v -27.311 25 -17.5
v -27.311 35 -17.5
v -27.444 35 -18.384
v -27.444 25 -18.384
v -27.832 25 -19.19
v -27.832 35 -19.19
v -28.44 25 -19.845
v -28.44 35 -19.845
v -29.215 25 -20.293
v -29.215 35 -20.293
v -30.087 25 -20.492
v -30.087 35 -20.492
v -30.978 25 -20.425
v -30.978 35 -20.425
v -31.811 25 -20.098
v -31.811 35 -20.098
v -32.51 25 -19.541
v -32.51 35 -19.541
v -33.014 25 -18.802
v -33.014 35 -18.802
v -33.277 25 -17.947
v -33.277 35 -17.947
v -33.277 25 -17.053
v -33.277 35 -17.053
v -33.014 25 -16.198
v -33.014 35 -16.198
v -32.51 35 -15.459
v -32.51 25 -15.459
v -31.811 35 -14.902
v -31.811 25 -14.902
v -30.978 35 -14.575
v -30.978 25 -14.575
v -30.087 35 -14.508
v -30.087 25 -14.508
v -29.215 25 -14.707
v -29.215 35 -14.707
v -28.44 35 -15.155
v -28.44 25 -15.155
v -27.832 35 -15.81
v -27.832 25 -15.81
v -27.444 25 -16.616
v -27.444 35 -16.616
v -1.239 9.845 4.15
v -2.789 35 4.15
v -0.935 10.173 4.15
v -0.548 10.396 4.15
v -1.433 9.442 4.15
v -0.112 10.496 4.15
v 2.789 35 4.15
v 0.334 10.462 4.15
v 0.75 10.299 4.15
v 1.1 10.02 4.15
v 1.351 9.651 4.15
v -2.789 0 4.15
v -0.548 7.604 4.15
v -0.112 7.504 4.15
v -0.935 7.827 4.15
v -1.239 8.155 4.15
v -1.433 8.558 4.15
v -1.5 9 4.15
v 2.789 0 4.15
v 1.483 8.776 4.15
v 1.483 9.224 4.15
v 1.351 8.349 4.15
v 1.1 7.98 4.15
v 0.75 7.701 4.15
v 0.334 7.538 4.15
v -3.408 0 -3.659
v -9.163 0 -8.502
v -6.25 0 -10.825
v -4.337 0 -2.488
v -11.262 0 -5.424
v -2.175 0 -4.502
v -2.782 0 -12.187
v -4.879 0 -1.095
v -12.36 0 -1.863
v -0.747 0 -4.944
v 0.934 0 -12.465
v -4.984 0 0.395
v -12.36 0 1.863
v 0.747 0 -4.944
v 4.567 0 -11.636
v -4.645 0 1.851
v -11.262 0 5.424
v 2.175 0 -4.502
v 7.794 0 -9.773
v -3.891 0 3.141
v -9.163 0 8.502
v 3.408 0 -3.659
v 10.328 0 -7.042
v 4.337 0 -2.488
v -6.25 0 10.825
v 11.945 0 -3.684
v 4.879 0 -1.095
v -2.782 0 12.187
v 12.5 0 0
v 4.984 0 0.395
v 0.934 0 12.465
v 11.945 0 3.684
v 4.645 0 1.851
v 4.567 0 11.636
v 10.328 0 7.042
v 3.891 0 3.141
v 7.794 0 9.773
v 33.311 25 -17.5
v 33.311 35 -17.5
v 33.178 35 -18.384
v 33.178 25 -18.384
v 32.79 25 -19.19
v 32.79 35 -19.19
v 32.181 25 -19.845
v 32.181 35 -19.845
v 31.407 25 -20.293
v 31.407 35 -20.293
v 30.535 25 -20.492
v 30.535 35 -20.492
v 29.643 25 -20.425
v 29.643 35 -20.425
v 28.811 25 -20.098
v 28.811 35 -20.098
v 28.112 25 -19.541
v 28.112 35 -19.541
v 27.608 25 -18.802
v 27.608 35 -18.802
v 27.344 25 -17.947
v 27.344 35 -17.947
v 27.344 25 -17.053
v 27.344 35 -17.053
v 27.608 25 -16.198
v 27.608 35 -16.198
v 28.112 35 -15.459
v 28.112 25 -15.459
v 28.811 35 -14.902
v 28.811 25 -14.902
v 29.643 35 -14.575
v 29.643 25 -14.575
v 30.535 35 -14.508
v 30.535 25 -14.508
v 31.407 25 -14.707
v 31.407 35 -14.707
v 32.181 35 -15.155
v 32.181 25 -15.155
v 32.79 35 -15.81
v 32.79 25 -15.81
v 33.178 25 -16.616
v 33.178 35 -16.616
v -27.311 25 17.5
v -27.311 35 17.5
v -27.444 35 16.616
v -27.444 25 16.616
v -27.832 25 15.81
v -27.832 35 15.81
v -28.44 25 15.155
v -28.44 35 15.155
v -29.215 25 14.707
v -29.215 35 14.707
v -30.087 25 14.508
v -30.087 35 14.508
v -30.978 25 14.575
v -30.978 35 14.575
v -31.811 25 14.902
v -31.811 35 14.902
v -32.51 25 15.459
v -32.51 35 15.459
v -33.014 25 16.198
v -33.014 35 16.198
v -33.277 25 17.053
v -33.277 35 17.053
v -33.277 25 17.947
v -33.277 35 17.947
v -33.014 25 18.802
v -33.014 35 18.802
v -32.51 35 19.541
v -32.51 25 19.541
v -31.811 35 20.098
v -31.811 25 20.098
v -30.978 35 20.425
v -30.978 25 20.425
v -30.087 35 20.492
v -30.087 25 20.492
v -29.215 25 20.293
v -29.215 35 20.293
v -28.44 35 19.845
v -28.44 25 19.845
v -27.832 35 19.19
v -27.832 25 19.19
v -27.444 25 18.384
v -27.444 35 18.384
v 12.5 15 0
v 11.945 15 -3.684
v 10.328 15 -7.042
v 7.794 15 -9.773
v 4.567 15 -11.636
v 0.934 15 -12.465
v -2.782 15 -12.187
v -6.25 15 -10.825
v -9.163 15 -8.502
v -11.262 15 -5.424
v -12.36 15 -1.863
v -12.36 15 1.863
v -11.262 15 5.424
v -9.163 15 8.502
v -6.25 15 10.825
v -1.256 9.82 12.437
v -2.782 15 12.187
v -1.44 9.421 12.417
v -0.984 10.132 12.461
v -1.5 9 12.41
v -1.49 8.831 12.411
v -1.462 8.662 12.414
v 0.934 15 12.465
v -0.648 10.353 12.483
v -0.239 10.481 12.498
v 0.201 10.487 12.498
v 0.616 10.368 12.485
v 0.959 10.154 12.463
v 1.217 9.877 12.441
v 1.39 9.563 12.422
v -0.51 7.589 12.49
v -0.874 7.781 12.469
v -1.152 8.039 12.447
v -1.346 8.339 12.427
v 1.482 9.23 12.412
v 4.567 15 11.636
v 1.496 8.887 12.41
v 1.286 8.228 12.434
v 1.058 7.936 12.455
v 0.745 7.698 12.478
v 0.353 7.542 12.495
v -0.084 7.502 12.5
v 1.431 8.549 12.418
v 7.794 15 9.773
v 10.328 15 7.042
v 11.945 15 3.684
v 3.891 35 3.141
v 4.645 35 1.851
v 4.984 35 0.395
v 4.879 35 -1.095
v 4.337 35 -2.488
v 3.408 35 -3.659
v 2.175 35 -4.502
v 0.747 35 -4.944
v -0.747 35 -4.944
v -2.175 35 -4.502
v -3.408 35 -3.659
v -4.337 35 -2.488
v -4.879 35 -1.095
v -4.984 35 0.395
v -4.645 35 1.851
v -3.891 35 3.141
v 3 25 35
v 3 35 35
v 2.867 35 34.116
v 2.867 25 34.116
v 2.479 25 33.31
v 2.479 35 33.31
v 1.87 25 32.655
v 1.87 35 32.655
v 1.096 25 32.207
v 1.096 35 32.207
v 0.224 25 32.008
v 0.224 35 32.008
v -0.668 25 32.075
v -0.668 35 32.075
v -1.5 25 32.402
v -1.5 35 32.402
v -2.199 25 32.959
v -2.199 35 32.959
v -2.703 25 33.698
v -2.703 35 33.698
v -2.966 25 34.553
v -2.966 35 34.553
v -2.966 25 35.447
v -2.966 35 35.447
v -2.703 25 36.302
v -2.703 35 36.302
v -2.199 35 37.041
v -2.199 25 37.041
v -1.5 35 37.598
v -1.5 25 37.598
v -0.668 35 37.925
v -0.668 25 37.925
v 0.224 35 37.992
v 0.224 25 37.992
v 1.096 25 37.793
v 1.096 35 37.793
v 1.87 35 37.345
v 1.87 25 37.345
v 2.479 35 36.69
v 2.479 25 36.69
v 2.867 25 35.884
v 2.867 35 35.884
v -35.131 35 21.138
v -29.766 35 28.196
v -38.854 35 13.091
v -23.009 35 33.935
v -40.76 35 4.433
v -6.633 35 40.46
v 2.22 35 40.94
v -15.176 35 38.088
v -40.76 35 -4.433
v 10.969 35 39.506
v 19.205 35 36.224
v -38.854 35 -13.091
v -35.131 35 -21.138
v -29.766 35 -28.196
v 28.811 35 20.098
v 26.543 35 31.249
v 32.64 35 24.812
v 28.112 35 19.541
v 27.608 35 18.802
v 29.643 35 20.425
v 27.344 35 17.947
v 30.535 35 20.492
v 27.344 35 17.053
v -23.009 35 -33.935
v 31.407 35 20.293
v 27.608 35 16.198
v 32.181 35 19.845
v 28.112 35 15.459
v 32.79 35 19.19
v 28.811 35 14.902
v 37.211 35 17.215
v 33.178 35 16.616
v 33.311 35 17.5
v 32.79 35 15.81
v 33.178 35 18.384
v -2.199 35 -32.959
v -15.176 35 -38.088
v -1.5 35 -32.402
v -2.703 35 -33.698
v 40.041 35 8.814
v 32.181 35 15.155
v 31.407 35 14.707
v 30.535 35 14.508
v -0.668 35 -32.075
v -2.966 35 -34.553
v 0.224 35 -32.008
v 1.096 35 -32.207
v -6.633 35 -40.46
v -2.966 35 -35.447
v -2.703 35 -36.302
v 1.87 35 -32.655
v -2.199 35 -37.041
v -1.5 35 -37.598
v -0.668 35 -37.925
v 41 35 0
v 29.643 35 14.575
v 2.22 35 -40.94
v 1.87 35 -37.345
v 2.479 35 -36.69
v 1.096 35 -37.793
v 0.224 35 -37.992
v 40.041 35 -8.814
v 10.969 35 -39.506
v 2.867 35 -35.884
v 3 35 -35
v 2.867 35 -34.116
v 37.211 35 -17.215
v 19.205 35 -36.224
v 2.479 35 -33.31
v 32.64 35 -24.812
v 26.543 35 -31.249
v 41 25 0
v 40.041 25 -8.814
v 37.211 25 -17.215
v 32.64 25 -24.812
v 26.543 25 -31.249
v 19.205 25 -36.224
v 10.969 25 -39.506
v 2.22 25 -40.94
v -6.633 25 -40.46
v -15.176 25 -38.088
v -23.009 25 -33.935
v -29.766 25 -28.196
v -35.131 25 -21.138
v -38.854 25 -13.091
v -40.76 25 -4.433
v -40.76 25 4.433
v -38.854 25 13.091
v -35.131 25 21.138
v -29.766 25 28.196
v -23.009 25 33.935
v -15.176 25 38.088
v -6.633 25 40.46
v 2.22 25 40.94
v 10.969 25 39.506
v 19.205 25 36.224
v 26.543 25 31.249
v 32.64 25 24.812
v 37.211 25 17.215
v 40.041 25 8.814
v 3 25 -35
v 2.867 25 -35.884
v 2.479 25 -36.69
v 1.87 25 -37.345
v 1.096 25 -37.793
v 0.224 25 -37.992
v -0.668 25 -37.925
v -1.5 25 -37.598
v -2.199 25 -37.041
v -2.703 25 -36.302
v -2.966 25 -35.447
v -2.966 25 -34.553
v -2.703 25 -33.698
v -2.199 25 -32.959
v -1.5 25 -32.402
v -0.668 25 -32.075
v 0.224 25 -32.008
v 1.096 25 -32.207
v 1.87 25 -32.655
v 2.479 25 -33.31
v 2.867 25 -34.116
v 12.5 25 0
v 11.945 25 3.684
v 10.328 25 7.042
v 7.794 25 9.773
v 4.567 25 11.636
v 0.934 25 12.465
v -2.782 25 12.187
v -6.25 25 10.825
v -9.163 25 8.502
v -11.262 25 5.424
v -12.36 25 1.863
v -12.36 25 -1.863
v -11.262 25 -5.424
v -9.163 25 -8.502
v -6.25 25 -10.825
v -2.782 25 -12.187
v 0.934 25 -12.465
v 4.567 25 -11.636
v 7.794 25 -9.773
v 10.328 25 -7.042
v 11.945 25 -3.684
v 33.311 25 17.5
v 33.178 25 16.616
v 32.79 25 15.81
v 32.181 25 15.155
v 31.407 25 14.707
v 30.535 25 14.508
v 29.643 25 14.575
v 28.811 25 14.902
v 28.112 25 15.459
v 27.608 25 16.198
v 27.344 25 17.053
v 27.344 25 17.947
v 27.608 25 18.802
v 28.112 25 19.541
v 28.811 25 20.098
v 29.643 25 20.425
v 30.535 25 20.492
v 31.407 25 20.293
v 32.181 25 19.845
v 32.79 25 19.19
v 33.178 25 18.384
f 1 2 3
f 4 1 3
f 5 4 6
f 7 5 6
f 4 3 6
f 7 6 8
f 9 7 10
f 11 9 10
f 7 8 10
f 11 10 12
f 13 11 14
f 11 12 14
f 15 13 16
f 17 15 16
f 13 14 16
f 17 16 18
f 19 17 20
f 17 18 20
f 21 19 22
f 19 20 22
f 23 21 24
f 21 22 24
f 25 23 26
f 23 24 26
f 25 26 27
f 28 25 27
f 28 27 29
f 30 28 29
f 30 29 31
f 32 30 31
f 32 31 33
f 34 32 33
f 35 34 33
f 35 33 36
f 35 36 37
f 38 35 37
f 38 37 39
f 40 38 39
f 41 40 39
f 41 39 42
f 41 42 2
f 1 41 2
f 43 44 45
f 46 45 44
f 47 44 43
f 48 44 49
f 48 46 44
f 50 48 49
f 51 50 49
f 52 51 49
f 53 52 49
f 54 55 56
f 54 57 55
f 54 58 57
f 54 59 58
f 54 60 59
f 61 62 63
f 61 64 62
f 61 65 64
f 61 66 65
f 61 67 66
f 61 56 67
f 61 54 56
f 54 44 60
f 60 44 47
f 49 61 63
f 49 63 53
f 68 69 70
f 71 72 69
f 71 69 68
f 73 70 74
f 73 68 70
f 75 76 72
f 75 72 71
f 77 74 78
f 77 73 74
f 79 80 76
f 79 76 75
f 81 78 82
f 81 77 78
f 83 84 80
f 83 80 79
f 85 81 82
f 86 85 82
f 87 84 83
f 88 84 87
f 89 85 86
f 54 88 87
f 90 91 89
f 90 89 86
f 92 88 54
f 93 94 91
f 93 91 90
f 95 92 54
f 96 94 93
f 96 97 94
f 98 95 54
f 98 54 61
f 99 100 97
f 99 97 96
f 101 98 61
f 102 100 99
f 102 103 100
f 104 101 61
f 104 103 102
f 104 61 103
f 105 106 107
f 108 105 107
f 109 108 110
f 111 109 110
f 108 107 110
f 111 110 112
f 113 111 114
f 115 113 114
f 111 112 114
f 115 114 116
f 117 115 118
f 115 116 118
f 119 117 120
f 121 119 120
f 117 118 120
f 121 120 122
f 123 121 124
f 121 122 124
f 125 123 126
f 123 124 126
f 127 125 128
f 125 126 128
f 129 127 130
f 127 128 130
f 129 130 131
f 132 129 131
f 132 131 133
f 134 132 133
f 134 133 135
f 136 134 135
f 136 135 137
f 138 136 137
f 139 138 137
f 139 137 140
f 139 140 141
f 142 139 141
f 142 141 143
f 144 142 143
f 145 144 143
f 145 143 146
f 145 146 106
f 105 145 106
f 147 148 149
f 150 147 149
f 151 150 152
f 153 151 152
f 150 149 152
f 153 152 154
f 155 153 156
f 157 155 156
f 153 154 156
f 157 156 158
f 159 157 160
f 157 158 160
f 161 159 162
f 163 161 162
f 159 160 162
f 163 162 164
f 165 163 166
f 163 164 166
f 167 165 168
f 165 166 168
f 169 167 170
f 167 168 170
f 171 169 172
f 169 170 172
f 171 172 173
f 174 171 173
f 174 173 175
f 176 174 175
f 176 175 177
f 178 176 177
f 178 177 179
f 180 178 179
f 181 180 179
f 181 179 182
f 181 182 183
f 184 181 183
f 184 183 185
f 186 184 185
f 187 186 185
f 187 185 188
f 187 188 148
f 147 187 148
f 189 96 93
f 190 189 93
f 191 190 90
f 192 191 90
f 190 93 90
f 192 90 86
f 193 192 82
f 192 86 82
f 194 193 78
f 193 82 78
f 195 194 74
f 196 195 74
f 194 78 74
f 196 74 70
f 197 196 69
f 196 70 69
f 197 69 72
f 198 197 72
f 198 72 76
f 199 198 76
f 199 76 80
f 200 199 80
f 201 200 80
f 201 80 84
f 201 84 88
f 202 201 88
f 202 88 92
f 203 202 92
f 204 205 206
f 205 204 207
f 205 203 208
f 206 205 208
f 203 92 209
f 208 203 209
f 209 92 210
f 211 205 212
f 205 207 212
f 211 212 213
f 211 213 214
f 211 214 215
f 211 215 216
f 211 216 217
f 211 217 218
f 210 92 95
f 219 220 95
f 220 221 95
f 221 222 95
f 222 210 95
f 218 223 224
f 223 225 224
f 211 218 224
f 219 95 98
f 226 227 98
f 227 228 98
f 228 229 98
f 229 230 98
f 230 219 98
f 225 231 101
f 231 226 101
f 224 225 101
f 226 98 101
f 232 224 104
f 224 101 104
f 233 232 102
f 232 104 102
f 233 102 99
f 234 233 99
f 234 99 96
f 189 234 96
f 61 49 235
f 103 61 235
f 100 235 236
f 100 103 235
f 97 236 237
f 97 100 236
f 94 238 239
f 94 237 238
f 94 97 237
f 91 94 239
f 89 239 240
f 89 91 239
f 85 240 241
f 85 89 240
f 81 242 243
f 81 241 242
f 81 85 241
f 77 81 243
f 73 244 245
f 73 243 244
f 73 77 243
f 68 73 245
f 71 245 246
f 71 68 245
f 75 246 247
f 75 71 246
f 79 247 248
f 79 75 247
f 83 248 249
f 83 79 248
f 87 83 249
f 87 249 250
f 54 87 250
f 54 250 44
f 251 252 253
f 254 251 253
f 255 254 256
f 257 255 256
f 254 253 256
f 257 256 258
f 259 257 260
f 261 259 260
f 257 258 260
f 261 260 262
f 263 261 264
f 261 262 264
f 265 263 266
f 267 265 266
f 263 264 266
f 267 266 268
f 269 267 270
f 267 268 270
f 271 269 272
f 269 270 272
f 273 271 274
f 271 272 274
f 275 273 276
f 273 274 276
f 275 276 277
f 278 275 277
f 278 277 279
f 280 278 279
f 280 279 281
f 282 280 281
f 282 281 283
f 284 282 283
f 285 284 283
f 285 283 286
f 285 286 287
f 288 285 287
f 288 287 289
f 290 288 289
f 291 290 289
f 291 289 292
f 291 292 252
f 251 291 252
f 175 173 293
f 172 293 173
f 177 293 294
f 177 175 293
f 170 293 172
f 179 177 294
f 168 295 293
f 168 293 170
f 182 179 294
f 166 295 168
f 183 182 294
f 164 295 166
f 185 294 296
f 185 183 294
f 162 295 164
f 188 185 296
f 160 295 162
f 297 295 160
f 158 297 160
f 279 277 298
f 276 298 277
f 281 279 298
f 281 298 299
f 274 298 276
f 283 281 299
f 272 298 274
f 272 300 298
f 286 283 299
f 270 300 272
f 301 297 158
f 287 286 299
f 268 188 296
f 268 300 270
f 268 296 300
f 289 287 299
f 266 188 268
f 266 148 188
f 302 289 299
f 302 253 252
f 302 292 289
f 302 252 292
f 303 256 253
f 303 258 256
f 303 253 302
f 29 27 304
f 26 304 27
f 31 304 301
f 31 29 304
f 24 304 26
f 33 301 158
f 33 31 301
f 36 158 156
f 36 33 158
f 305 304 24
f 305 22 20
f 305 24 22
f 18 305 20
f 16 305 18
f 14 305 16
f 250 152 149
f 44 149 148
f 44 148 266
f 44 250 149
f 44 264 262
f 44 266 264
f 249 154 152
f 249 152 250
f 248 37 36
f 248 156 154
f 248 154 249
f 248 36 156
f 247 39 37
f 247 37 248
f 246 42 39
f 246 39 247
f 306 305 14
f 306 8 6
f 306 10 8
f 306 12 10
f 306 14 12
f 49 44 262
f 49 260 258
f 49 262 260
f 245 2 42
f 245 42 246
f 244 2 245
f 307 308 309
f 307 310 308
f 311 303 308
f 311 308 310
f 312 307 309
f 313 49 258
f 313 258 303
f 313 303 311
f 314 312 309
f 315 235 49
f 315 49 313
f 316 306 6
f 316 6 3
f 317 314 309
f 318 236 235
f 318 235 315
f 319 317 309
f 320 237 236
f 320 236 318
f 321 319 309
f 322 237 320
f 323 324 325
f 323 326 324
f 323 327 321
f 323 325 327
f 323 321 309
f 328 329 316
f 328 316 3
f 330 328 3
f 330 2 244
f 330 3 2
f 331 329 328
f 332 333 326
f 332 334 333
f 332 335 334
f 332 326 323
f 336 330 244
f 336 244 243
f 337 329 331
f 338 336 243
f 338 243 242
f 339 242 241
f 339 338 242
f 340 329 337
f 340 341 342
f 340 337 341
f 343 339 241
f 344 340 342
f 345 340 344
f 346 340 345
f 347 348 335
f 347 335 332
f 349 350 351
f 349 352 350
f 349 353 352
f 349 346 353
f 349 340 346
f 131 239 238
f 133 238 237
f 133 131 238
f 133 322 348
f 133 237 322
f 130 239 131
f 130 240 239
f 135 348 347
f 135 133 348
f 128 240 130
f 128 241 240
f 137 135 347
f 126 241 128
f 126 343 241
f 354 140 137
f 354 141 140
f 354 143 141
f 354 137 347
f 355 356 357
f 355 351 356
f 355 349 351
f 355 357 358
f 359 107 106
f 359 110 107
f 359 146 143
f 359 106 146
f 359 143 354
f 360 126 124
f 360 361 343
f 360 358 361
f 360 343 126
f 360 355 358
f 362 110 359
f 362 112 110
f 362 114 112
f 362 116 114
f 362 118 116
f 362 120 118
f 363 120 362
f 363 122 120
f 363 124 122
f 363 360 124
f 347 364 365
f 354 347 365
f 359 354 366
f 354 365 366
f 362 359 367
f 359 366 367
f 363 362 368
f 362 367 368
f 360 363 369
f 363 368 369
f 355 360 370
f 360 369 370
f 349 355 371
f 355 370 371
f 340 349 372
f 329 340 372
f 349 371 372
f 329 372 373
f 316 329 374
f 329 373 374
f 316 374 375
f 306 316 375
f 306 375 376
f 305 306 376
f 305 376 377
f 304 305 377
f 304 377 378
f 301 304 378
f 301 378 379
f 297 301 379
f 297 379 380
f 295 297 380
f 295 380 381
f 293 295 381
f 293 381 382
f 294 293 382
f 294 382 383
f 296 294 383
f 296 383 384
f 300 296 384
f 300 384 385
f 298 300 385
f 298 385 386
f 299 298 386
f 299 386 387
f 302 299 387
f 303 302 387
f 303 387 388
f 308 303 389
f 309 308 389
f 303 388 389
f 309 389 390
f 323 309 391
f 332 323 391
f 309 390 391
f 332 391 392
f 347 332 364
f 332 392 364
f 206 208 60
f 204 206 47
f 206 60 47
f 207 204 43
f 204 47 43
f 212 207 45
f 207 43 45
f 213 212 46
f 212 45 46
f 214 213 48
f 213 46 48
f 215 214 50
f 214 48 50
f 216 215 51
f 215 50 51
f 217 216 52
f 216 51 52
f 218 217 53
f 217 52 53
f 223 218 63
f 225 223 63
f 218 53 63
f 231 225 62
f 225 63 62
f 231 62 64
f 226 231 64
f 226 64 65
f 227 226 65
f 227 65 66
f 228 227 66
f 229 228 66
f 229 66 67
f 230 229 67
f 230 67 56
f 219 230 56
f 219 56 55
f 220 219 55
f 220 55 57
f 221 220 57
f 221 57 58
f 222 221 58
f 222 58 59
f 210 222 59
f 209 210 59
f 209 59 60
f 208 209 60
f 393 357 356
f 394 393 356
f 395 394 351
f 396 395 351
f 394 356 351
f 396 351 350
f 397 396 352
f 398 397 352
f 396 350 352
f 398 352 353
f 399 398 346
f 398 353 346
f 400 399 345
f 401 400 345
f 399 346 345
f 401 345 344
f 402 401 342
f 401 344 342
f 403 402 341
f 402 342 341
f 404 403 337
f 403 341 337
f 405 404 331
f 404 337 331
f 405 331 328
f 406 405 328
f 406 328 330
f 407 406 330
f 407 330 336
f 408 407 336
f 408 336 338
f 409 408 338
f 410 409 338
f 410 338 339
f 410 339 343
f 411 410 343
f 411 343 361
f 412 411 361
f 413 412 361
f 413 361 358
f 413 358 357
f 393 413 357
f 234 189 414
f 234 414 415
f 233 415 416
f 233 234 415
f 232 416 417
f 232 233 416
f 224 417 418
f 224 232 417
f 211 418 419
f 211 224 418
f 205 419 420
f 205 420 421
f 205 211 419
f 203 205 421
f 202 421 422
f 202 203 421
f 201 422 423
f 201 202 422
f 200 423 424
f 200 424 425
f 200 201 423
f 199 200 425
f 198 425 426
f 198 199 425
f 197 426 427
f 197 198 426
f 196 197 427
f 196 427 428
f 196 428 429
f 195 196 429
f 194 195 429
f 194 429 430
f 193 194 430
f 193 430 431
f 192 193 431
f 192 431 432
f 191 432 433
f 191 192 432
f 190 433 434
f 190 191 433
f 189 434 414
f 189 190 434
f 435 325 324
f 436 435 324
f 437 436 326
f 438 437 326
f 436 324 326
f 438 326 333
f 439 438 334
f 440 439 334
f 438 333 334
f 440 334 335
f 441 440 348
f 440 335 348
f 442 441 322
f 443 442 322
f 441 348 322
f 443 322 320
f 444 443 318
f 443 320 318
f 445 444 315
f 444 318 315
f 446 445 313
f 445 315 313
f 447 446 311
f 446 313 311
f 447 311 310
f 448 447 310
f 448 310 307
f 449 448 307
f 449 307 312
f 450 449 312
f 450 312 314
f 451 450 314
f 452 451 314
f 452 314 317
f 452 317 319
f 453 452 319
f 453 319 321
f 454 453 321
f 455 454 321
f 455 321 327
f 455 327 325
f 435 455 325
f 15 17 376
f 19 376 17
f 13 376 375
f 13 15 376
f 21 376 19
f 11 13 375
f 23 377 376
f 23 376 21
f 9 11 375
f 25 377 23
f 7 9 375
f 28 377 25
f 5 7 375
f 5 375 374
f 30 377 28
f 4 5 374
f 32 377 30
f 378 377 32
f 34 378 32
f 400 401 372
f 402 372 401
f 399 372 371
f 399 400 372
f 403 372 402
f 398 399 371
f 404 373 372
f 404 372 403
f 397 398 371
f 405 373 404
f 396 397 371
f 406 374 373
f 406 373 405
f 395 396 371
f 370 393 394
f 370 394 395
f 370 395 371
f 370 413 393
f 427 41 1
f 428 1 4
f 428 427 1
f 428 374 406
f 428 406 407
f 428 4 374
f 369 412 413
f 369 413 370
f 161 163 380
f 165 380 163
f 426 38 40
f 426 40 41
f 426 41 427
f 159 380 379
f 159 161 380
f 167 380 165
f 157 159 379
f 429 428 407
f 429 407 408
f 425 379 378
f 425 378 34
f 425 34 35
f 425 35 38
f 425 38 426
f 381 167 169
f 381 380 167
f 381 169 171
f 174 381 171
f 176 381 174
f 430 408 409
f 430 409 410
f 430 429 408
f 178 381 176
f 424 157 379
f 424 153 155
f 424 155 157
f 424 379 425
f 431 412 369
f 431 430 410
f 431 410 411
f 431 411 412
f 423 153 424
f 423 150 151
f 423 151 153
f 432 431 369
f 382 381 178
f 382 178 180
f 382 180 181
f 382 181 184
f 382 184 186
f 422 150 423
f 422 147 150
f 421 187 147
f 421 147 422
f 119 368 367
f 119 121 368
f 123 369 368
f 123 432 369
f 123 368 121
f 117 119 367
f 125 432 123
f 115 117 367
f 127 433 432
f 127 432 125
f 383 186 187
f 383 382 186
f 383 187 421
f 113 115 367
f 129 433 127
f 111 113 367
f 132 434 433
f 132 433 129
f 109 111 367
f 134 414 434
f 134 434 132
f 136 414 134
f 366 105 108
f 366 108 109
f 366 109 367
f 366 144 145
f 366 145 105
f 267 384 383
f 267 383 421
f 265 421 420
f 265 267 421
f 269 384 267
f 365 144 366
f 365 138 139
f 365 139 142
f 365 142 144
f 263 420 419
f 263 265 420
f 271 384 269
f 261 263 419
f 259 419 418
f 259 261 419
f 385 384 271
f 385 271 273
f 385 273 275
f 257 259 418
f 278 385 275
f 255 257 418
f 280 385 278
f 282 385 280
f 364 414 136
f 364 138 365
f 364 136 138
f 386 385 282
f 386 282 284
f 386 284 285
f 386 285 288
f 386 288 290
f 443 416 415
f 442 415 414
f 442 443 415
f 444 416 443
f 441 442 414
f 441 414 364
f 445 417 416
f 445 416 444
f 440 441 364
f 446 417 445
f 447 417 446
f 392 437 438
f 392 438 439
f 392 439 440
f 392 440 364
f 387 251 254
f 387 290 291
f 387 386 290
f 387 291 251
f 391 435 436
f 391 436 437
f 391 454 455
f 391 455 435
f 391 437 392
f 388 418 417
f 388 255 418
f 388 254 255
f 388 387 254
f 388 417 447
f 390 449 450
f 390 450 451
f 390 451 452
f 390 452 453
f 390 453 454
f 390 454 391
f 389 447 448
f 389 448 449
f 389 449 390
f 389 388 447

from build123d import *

# Parameters (mm, degrees)
SKETCH1_R           = 12.5
SKETCH1_R_2         = 5
BOSS_EXTRUDE1_DEPTH = 15
SKETCH2_R           = 41
SKETCH2_R_2         = 5
BOSS_EXTRUDE2_DEPTH = 20
SKETCH3_R           = 3
CUT_EXTRUDE1_DEPTH  = 36
BOSS_EXTRUDE3_DEPTH = 35
SKETCH5_R           = 1.5
CUT_EXTRUDE2_DEPTH  = 37.85
SKETCH6_R           = 41
SKETCH6_R_2         = 12.5
CUT_EXTRUDE3_DEPTH  = 10


with BuildPart() as part:
    # Sketch1 → Boss-Extrude1 (new body)
    with BuildSketch(Plane(origin=(0, 0, 0), x_dir=(1, 0, 0), z_dir=(0, 1, 0))):
        Circle(SKETCH1_R)
        Circle(SKETCH1_R_2, mode=Mode.SUBTRACT)
    extrude(amount=BOSS_EXTRUDE1_DEPTH)

    # Sketch2 → Boss-Extrude2 (add)
    with BuildSketch(Plane(origin=(0, 15, 0), x_dir=(1, 0, 0), z_dir=(0, 1, 0))):
        Circle(SKETCH2_R)
        Circle(SKETCH2_R_2, mode=Mode.SUBTRACT)
    extrude(amount=BOSS_EXTRUDE2_DEPTH)

    # Sketch3 → Cut-Extrude1 (cut, through all)
    with BuildSketch(Plane(origin=(0, 35, 0), x_dir=(1, 0, 0), z_dir=(0, 1, 0))):
        with Locations((0, 35)):
            Circle(SKETCH3_R)
        with Locations((30.310889132, 17.5)):
            Circle(SKETCH3_R)
        with Locations((30.310889132, -17.5)):
            Circle(SKETCH3_R)
        with Locations((0, -35)):
            Circle(SKETCH3_R)
        with Locations((-30.310889132, -17.5)):
            Circle(SKETCH3_R)
        with Locations((-30.310889132, 17.5)):
            Circle(SKETCH3_R)
    extrude(amount=-CUT_EXTRUDE1_DEPTH, mode=Mode.SUBTRACT)

    # Sketch4 → Boss-Extrude3 (add)
    with BuildSketch(Plane.XZ):
        with BuildLine():
            ThreePointArc((3.067854181, 4.15), (0, 5.160836103), (-3.067854181, 4.15))
            Line((-3.067854181, 4.15), (3.067854181, 4.15))
        make_face()
    extrude(amount=-BOSS_EXTRUDE3_DEPTH)

    # Sketch5 → Cut-Extrude2 (cut, through all)
    with BuildSketch(Plane(origin=(0, 0, 4.15), x_dir=(-1, 0, 0), z_dir=(0, 0, -1))):
        with Locations((0, 9)):
            Circle(SKETCH5_R)
    extrude(amount=-CUT_EXTRUDE2_DEPTH, mode=Mode.SUBTRACT)

    # Sketch6 → Cut-Extrude3 (cut)
    with BuildSketch(Plane.XZ.offset(-15)):
        Circle(SKETCH6_R)
        Circle(SKETCH6_R_2, mode=Mode.SUBTRACT)
    extrude(amount=-CUT_EXTRUDE3_DEPTH, mode=Mode.SUBTRACT)


solid = part.part
